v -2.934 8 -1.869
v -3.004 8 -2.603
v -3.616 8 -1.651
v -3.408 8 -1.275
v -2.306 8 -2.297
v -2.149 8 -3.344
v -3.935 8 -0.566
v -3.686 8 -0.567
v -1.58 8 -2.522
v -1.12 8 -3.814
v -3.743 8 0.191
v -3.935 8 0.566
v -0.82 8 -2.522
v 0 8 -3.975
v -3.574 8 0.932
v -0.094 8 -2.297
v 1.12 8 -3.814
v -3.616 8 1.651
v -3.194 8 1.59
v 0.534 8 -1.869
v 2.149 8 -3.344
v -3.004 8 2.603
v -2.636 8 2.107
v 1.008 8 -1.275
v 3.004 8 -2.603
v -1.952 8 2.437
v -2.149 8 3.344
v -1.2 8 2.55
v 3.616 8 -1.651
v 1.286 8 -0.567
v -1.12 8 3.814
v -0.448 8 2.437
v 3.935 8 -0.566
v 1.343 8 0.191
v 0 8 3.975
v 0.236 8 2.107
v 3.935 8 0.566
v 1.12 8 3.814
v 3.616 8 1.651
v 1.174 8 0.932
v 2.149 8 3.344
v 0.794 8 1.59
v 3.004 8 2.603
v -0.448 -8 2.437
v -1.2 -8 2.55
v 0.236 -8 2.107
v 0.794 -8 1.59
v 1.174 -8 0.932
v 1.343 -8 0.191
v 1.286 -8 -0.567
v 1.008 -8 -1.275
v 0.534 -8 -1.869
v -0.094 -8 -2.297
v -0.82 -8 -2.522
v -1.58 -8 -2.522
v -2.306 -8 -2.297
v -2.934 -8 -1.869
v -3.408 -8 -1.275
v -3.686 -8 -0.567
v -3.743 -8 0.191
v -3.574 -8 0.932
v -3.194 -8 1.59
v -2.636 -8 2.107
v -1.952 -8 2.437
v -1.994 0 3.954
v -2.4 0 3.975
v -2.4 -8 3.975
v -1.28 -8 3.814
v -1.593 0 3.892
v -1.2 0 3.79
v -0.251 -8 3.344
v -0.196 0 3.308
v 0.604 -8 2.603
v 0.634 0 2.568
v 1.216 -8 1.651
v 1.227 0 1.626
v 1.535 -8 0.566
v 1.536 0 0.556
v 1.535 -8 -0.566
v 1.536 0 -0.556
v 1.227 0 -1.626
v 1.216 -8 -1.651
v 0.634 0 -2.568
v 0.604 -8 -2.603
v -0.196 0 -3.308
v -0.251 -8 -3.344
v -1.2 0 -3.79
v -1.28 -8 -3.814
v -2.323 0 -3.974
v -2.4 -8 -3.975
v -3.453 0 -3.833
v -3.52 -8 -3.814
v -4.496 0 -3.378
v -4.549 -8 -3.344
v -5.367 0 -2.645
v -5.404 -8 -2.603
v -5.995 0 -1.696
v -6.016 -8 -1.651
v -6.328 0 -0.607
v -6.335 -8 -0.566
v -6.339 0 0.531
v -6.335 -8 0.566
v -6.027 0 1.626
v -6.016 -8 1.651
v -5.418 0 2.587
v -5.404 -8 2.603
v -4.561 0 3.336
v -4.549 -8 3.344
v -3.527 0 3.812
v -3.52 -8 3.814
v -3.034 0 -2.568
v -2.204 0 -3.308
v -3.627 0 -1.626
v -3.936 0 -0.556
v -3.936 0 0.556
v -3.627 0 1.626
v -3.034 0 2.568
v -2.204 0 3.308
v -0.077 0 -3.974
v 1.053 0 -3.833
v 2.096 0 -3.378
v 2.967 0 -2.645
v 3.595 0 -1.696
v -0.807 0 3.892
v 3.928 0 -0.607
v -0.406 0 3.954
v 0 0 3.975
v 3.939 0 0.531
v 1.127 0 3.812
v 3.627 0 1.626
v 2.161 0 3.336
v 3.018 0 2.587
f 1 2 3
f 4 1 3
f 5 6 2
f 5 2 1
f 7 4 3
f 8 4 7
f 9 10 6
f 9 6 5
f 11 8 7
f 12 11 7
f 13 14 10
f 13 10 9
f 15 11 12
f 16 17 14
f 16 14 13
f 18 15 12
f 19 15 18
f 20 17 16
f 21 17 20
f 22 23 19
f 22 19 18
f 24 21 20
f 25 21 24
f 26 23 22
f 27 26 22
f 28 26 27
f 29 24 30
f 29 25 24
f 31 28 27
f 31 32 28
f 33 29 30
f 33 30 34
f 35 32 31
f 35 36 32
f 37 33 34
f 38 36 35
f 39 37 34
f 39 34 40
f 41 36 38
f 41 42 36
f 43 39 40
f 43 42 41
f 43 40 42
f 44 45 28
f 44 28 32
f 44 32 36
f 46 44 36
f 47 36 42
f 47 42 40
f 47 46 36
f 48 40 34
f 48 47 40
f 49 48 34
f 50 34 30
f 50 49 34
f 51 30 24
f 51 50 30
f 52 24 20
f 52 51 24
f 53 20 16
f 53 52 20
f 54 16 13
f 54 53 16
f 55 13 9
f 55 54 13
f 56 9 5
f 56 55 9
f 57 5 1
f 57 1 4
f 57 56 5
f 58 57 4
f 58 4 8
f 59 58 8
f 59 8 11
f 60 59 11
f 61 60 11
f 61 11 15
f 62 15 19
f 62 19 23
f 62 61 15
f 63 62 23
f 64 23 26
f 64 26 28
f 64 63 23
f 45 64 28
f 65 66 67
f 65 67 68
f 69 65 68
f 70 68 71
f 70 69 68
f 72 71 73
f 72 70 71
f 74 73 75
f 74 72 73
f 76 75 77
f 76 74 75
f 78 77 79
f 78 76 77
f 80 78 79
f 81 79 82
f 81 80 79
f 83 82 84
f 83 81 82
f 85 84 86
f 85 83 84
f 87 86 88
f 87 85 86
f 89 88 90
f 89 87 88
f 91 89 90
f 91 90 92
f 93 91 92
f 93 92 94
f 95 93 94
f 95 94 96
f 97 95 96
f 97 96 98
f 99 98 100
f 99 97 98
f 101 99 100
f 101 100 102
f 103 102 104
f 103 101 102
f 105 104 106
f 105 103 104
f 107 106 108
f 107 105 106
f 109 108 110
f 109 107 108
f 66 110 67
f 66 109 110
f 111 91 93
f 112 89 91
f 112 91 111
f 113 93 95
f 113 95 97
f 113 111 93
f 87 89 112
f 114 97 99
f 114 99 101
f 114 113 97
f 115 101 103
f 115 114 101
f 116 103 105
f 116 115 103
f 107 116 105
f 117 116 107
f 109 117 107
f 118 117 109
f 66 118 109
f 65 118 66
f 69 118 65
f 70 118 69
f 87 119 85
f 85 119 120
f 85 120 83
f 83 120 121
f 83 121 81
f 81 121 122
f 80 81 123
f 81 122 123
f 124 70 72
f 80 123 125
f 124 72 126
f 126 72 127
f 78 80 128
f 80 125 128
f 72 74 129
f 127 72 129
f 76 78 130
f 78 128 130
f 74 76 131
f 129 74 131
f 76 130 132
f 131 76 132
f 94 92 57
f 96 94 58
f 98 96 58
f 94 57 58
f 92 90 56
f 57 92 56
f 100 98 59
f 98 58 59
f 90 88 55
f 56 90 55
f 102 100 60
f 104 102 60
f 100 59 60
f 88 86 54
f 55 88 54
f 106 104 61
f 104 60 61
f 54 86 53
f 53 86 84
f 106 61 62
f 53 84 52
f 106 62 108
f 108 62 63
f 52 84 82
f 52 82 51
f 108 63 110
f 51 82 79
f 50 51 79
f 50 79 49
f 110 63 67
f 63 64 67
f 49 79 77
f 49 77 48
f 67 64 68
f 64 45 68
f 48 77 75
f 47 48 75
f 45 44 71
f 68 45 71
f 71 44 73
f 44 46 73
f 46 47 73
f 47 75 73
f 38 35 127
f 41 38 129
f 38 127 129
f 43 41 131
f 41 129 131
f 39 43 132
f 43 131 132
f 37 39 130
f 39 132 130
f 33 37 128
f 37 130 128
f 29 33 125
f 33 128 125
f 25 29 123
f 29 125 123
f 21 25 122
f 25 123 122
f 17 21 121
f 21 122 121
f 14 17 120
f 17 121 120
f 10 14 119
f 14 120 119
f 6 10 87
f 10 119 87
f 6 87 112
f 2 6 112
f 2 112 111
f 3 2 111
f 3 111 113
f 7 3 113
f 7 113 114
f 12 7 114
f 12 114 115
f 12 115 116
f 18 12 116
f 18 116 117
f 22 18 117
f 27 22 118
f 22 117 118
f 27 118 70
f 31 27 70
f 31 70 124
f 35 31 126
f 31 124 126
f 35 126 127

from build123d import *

# Parameters (mm, degrees)
SKETCH1_R               = 3.975
BOSS_EXTRUDE1_DEPTH     = 8
SKETCH1_3_R             = 3.975
BOSS_EXTRUDE2_DEPTH     = 8
CUT_EXTRUDE1_DEPTH      = 8
CUT_EXTRUDE1_DEPTH_BACK = 8
SKETCH1_5_R             = 2.55


with BuildPart() as part:
    # Sketch1 → Boss-Extrude1 (new body)
    with BuildSketch(Plane(origin=(0, 0, 0), x_dir=(1, 0, 0), z_dir=(0, 1, 0))):
        with Locations(Location((0, 0, 0), (0, 0, 270))):
            Circle(SKETCH1_R)
    extrude(amount=BOSS_EXTRUDE1_DEPTH)

    # Sketch1<3> → Boss-Extrude2 (add)
    with BuildSketch(Plane(origin=(0, 0, 0), x_dir=(1, 0, 0), z_dir=(0, 1, 0))):
        with Locations(Location((-2.4, 0, 0), (0, 0, 270))):
            Circle(SKETCH1_3_R)
    extrude(amount=-BOSS_EXTRUDE2_DEPTH)

    # Sketch1<5> → Cut-Extrude1 (cut, two sides: drawn at the far end of the back side and taken through both)
    with BuildSketch(Plane(origin=(0, 0, 0), x_dir=(1, 0, 0), z_dir=(0, 1, 0)).offset(-CUT_EXTRUDE1_DEPTH_BACK)):
        with Locations(Location((-1.2, 0, 0), (0, 0, 270))):
            Circle(SKETCH1_5_R)
    extrude(amount=CUT_EXTRUDE1_DEPTH + CUT_EXTRUDE1_DEPTH_BACK, mode=Mode.SUBTRACT)


solid = part.part
